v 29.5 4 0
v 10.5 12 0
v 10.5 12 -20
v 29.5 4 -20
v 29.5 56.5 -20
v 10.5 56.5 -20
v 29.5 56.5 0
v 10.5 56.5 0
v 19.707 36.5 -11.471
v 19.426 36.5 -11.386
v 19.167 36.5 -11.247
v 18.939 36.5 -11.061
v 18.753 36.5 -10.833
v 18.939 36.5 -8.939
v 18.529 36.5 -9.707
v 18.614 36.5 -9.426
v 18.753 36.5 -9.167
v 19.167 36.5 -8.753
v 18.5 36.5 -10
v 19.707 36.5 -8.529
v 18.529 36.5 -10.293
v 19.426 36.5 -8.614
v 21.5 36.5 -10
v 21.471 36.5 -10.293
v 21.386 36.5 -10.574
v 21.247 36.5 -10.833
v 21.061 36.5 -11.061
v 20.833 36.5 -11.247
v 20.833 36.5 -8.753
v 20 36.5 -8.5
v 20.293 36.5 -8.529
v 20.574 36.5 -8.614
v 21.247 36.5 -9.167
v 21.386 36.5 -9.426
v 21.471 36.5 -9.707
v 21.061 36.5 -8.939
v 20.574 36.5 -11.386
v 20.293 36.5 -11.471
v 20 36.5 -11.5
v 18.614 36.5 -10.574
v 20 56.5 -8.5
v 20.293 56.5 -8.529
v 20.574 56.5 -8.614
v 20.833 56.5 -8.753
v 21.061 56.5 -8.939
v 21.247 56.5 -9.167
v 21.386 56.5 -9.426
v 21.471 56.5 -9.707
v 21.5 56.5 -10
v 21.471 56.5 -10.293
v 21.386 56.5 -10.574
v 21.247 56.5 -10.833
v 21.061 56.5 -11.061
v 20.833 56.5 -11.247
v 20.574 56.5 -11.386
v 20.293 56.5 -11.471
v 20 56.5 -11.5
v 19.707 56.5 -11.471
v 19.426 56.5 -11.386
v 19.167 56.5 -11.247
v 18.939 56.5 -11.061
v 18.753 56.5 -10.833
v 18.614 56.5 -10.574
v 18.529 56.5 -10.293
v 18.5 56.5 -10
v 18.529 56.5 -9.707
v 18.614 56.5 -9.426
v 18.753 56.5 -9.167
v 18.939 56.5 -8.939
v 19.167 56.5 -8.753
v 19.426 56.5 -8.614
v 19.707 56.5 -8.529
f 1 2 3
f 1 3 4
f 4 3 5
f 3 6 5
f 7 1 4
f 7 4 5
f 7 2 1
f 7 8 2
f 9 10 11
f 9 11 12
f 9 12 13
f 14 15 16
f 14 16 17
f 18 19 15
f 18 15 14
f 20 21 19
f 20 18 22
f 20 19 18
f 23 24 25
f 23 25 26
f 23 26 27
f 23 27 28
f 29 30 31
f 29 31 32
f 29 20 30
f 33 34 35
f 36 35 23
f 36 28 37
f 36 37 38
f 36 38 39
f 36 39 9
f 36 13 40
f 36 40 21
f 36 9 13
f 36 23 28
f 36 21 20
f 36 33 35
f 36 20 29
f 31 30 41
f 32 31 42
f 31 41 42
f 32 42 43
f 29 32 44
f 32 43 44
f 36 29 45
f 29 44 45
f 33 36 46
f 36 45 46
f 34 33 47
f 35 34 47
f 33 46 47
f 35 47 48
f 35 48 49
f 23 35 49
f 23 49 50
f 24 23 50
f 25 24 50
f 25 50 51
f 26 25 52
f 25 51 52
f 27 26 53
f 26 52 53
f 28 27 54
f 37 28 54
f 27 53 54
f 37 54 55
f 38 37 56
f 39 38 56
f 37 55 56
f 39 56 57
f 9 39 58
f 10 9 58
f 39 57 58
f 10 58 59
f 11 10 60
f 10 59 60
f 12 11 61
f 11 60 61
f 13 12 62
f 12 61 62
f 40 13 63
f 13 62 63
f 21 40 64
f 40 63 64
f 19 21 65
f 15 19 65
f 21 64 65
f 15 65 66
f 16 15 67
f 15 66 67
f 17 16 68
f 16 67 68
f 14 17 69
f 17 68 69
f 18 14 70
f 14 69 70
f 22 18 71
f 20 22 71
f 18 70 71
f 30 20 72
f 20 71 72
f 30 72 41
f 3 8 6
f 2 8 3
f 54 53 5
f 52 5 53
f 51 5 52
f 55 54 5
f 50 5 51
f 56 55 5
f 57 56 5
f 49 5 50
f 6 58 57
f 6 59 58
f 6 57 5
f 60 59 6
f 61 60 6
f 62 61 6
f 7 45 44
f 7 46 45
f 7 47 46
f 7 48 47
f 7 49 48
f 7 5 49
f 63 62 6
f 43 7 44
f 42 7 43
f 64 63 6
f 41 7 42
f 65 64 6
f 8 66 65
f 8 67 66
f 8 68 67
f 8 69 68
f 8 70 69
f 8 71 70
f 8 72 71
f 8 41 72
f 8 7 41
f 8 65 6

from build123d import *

# Parameters (mm, degrees)
EXTRUDE_1_DEPTH     = 20
SKETCH_2_R          = 1.5
CUT_EXTRUDE_1_DEPTH = 20


with BuildPart() as part:
    # 草图1 → 凸台-拉伸1 (new body)
    with BuildSketch(Plane.XY):
        Polygon((10.5, 12), (29.5, 4), (29.5, 56.5), (10.5, 56.5), align=None)
    extrude(amount=-EXTRUDE_1_DEPTH)

    # 草图2 → 切除-拉伸1 (cut)
    with BuildSketch(Plane(origin=(0, 56.5, 0), x_dir=(1, 0, 0), z_dir=(0, 1, 0))):
        with Locations(Location((20, 10, 0), (0, 0, 270))):
            Circle(SKETCH_2_R)
    extrude(amount=-CUT_EXTRUDE_1_DEPTH, mode=Mode.SUBTRACT)


solid = part.part
